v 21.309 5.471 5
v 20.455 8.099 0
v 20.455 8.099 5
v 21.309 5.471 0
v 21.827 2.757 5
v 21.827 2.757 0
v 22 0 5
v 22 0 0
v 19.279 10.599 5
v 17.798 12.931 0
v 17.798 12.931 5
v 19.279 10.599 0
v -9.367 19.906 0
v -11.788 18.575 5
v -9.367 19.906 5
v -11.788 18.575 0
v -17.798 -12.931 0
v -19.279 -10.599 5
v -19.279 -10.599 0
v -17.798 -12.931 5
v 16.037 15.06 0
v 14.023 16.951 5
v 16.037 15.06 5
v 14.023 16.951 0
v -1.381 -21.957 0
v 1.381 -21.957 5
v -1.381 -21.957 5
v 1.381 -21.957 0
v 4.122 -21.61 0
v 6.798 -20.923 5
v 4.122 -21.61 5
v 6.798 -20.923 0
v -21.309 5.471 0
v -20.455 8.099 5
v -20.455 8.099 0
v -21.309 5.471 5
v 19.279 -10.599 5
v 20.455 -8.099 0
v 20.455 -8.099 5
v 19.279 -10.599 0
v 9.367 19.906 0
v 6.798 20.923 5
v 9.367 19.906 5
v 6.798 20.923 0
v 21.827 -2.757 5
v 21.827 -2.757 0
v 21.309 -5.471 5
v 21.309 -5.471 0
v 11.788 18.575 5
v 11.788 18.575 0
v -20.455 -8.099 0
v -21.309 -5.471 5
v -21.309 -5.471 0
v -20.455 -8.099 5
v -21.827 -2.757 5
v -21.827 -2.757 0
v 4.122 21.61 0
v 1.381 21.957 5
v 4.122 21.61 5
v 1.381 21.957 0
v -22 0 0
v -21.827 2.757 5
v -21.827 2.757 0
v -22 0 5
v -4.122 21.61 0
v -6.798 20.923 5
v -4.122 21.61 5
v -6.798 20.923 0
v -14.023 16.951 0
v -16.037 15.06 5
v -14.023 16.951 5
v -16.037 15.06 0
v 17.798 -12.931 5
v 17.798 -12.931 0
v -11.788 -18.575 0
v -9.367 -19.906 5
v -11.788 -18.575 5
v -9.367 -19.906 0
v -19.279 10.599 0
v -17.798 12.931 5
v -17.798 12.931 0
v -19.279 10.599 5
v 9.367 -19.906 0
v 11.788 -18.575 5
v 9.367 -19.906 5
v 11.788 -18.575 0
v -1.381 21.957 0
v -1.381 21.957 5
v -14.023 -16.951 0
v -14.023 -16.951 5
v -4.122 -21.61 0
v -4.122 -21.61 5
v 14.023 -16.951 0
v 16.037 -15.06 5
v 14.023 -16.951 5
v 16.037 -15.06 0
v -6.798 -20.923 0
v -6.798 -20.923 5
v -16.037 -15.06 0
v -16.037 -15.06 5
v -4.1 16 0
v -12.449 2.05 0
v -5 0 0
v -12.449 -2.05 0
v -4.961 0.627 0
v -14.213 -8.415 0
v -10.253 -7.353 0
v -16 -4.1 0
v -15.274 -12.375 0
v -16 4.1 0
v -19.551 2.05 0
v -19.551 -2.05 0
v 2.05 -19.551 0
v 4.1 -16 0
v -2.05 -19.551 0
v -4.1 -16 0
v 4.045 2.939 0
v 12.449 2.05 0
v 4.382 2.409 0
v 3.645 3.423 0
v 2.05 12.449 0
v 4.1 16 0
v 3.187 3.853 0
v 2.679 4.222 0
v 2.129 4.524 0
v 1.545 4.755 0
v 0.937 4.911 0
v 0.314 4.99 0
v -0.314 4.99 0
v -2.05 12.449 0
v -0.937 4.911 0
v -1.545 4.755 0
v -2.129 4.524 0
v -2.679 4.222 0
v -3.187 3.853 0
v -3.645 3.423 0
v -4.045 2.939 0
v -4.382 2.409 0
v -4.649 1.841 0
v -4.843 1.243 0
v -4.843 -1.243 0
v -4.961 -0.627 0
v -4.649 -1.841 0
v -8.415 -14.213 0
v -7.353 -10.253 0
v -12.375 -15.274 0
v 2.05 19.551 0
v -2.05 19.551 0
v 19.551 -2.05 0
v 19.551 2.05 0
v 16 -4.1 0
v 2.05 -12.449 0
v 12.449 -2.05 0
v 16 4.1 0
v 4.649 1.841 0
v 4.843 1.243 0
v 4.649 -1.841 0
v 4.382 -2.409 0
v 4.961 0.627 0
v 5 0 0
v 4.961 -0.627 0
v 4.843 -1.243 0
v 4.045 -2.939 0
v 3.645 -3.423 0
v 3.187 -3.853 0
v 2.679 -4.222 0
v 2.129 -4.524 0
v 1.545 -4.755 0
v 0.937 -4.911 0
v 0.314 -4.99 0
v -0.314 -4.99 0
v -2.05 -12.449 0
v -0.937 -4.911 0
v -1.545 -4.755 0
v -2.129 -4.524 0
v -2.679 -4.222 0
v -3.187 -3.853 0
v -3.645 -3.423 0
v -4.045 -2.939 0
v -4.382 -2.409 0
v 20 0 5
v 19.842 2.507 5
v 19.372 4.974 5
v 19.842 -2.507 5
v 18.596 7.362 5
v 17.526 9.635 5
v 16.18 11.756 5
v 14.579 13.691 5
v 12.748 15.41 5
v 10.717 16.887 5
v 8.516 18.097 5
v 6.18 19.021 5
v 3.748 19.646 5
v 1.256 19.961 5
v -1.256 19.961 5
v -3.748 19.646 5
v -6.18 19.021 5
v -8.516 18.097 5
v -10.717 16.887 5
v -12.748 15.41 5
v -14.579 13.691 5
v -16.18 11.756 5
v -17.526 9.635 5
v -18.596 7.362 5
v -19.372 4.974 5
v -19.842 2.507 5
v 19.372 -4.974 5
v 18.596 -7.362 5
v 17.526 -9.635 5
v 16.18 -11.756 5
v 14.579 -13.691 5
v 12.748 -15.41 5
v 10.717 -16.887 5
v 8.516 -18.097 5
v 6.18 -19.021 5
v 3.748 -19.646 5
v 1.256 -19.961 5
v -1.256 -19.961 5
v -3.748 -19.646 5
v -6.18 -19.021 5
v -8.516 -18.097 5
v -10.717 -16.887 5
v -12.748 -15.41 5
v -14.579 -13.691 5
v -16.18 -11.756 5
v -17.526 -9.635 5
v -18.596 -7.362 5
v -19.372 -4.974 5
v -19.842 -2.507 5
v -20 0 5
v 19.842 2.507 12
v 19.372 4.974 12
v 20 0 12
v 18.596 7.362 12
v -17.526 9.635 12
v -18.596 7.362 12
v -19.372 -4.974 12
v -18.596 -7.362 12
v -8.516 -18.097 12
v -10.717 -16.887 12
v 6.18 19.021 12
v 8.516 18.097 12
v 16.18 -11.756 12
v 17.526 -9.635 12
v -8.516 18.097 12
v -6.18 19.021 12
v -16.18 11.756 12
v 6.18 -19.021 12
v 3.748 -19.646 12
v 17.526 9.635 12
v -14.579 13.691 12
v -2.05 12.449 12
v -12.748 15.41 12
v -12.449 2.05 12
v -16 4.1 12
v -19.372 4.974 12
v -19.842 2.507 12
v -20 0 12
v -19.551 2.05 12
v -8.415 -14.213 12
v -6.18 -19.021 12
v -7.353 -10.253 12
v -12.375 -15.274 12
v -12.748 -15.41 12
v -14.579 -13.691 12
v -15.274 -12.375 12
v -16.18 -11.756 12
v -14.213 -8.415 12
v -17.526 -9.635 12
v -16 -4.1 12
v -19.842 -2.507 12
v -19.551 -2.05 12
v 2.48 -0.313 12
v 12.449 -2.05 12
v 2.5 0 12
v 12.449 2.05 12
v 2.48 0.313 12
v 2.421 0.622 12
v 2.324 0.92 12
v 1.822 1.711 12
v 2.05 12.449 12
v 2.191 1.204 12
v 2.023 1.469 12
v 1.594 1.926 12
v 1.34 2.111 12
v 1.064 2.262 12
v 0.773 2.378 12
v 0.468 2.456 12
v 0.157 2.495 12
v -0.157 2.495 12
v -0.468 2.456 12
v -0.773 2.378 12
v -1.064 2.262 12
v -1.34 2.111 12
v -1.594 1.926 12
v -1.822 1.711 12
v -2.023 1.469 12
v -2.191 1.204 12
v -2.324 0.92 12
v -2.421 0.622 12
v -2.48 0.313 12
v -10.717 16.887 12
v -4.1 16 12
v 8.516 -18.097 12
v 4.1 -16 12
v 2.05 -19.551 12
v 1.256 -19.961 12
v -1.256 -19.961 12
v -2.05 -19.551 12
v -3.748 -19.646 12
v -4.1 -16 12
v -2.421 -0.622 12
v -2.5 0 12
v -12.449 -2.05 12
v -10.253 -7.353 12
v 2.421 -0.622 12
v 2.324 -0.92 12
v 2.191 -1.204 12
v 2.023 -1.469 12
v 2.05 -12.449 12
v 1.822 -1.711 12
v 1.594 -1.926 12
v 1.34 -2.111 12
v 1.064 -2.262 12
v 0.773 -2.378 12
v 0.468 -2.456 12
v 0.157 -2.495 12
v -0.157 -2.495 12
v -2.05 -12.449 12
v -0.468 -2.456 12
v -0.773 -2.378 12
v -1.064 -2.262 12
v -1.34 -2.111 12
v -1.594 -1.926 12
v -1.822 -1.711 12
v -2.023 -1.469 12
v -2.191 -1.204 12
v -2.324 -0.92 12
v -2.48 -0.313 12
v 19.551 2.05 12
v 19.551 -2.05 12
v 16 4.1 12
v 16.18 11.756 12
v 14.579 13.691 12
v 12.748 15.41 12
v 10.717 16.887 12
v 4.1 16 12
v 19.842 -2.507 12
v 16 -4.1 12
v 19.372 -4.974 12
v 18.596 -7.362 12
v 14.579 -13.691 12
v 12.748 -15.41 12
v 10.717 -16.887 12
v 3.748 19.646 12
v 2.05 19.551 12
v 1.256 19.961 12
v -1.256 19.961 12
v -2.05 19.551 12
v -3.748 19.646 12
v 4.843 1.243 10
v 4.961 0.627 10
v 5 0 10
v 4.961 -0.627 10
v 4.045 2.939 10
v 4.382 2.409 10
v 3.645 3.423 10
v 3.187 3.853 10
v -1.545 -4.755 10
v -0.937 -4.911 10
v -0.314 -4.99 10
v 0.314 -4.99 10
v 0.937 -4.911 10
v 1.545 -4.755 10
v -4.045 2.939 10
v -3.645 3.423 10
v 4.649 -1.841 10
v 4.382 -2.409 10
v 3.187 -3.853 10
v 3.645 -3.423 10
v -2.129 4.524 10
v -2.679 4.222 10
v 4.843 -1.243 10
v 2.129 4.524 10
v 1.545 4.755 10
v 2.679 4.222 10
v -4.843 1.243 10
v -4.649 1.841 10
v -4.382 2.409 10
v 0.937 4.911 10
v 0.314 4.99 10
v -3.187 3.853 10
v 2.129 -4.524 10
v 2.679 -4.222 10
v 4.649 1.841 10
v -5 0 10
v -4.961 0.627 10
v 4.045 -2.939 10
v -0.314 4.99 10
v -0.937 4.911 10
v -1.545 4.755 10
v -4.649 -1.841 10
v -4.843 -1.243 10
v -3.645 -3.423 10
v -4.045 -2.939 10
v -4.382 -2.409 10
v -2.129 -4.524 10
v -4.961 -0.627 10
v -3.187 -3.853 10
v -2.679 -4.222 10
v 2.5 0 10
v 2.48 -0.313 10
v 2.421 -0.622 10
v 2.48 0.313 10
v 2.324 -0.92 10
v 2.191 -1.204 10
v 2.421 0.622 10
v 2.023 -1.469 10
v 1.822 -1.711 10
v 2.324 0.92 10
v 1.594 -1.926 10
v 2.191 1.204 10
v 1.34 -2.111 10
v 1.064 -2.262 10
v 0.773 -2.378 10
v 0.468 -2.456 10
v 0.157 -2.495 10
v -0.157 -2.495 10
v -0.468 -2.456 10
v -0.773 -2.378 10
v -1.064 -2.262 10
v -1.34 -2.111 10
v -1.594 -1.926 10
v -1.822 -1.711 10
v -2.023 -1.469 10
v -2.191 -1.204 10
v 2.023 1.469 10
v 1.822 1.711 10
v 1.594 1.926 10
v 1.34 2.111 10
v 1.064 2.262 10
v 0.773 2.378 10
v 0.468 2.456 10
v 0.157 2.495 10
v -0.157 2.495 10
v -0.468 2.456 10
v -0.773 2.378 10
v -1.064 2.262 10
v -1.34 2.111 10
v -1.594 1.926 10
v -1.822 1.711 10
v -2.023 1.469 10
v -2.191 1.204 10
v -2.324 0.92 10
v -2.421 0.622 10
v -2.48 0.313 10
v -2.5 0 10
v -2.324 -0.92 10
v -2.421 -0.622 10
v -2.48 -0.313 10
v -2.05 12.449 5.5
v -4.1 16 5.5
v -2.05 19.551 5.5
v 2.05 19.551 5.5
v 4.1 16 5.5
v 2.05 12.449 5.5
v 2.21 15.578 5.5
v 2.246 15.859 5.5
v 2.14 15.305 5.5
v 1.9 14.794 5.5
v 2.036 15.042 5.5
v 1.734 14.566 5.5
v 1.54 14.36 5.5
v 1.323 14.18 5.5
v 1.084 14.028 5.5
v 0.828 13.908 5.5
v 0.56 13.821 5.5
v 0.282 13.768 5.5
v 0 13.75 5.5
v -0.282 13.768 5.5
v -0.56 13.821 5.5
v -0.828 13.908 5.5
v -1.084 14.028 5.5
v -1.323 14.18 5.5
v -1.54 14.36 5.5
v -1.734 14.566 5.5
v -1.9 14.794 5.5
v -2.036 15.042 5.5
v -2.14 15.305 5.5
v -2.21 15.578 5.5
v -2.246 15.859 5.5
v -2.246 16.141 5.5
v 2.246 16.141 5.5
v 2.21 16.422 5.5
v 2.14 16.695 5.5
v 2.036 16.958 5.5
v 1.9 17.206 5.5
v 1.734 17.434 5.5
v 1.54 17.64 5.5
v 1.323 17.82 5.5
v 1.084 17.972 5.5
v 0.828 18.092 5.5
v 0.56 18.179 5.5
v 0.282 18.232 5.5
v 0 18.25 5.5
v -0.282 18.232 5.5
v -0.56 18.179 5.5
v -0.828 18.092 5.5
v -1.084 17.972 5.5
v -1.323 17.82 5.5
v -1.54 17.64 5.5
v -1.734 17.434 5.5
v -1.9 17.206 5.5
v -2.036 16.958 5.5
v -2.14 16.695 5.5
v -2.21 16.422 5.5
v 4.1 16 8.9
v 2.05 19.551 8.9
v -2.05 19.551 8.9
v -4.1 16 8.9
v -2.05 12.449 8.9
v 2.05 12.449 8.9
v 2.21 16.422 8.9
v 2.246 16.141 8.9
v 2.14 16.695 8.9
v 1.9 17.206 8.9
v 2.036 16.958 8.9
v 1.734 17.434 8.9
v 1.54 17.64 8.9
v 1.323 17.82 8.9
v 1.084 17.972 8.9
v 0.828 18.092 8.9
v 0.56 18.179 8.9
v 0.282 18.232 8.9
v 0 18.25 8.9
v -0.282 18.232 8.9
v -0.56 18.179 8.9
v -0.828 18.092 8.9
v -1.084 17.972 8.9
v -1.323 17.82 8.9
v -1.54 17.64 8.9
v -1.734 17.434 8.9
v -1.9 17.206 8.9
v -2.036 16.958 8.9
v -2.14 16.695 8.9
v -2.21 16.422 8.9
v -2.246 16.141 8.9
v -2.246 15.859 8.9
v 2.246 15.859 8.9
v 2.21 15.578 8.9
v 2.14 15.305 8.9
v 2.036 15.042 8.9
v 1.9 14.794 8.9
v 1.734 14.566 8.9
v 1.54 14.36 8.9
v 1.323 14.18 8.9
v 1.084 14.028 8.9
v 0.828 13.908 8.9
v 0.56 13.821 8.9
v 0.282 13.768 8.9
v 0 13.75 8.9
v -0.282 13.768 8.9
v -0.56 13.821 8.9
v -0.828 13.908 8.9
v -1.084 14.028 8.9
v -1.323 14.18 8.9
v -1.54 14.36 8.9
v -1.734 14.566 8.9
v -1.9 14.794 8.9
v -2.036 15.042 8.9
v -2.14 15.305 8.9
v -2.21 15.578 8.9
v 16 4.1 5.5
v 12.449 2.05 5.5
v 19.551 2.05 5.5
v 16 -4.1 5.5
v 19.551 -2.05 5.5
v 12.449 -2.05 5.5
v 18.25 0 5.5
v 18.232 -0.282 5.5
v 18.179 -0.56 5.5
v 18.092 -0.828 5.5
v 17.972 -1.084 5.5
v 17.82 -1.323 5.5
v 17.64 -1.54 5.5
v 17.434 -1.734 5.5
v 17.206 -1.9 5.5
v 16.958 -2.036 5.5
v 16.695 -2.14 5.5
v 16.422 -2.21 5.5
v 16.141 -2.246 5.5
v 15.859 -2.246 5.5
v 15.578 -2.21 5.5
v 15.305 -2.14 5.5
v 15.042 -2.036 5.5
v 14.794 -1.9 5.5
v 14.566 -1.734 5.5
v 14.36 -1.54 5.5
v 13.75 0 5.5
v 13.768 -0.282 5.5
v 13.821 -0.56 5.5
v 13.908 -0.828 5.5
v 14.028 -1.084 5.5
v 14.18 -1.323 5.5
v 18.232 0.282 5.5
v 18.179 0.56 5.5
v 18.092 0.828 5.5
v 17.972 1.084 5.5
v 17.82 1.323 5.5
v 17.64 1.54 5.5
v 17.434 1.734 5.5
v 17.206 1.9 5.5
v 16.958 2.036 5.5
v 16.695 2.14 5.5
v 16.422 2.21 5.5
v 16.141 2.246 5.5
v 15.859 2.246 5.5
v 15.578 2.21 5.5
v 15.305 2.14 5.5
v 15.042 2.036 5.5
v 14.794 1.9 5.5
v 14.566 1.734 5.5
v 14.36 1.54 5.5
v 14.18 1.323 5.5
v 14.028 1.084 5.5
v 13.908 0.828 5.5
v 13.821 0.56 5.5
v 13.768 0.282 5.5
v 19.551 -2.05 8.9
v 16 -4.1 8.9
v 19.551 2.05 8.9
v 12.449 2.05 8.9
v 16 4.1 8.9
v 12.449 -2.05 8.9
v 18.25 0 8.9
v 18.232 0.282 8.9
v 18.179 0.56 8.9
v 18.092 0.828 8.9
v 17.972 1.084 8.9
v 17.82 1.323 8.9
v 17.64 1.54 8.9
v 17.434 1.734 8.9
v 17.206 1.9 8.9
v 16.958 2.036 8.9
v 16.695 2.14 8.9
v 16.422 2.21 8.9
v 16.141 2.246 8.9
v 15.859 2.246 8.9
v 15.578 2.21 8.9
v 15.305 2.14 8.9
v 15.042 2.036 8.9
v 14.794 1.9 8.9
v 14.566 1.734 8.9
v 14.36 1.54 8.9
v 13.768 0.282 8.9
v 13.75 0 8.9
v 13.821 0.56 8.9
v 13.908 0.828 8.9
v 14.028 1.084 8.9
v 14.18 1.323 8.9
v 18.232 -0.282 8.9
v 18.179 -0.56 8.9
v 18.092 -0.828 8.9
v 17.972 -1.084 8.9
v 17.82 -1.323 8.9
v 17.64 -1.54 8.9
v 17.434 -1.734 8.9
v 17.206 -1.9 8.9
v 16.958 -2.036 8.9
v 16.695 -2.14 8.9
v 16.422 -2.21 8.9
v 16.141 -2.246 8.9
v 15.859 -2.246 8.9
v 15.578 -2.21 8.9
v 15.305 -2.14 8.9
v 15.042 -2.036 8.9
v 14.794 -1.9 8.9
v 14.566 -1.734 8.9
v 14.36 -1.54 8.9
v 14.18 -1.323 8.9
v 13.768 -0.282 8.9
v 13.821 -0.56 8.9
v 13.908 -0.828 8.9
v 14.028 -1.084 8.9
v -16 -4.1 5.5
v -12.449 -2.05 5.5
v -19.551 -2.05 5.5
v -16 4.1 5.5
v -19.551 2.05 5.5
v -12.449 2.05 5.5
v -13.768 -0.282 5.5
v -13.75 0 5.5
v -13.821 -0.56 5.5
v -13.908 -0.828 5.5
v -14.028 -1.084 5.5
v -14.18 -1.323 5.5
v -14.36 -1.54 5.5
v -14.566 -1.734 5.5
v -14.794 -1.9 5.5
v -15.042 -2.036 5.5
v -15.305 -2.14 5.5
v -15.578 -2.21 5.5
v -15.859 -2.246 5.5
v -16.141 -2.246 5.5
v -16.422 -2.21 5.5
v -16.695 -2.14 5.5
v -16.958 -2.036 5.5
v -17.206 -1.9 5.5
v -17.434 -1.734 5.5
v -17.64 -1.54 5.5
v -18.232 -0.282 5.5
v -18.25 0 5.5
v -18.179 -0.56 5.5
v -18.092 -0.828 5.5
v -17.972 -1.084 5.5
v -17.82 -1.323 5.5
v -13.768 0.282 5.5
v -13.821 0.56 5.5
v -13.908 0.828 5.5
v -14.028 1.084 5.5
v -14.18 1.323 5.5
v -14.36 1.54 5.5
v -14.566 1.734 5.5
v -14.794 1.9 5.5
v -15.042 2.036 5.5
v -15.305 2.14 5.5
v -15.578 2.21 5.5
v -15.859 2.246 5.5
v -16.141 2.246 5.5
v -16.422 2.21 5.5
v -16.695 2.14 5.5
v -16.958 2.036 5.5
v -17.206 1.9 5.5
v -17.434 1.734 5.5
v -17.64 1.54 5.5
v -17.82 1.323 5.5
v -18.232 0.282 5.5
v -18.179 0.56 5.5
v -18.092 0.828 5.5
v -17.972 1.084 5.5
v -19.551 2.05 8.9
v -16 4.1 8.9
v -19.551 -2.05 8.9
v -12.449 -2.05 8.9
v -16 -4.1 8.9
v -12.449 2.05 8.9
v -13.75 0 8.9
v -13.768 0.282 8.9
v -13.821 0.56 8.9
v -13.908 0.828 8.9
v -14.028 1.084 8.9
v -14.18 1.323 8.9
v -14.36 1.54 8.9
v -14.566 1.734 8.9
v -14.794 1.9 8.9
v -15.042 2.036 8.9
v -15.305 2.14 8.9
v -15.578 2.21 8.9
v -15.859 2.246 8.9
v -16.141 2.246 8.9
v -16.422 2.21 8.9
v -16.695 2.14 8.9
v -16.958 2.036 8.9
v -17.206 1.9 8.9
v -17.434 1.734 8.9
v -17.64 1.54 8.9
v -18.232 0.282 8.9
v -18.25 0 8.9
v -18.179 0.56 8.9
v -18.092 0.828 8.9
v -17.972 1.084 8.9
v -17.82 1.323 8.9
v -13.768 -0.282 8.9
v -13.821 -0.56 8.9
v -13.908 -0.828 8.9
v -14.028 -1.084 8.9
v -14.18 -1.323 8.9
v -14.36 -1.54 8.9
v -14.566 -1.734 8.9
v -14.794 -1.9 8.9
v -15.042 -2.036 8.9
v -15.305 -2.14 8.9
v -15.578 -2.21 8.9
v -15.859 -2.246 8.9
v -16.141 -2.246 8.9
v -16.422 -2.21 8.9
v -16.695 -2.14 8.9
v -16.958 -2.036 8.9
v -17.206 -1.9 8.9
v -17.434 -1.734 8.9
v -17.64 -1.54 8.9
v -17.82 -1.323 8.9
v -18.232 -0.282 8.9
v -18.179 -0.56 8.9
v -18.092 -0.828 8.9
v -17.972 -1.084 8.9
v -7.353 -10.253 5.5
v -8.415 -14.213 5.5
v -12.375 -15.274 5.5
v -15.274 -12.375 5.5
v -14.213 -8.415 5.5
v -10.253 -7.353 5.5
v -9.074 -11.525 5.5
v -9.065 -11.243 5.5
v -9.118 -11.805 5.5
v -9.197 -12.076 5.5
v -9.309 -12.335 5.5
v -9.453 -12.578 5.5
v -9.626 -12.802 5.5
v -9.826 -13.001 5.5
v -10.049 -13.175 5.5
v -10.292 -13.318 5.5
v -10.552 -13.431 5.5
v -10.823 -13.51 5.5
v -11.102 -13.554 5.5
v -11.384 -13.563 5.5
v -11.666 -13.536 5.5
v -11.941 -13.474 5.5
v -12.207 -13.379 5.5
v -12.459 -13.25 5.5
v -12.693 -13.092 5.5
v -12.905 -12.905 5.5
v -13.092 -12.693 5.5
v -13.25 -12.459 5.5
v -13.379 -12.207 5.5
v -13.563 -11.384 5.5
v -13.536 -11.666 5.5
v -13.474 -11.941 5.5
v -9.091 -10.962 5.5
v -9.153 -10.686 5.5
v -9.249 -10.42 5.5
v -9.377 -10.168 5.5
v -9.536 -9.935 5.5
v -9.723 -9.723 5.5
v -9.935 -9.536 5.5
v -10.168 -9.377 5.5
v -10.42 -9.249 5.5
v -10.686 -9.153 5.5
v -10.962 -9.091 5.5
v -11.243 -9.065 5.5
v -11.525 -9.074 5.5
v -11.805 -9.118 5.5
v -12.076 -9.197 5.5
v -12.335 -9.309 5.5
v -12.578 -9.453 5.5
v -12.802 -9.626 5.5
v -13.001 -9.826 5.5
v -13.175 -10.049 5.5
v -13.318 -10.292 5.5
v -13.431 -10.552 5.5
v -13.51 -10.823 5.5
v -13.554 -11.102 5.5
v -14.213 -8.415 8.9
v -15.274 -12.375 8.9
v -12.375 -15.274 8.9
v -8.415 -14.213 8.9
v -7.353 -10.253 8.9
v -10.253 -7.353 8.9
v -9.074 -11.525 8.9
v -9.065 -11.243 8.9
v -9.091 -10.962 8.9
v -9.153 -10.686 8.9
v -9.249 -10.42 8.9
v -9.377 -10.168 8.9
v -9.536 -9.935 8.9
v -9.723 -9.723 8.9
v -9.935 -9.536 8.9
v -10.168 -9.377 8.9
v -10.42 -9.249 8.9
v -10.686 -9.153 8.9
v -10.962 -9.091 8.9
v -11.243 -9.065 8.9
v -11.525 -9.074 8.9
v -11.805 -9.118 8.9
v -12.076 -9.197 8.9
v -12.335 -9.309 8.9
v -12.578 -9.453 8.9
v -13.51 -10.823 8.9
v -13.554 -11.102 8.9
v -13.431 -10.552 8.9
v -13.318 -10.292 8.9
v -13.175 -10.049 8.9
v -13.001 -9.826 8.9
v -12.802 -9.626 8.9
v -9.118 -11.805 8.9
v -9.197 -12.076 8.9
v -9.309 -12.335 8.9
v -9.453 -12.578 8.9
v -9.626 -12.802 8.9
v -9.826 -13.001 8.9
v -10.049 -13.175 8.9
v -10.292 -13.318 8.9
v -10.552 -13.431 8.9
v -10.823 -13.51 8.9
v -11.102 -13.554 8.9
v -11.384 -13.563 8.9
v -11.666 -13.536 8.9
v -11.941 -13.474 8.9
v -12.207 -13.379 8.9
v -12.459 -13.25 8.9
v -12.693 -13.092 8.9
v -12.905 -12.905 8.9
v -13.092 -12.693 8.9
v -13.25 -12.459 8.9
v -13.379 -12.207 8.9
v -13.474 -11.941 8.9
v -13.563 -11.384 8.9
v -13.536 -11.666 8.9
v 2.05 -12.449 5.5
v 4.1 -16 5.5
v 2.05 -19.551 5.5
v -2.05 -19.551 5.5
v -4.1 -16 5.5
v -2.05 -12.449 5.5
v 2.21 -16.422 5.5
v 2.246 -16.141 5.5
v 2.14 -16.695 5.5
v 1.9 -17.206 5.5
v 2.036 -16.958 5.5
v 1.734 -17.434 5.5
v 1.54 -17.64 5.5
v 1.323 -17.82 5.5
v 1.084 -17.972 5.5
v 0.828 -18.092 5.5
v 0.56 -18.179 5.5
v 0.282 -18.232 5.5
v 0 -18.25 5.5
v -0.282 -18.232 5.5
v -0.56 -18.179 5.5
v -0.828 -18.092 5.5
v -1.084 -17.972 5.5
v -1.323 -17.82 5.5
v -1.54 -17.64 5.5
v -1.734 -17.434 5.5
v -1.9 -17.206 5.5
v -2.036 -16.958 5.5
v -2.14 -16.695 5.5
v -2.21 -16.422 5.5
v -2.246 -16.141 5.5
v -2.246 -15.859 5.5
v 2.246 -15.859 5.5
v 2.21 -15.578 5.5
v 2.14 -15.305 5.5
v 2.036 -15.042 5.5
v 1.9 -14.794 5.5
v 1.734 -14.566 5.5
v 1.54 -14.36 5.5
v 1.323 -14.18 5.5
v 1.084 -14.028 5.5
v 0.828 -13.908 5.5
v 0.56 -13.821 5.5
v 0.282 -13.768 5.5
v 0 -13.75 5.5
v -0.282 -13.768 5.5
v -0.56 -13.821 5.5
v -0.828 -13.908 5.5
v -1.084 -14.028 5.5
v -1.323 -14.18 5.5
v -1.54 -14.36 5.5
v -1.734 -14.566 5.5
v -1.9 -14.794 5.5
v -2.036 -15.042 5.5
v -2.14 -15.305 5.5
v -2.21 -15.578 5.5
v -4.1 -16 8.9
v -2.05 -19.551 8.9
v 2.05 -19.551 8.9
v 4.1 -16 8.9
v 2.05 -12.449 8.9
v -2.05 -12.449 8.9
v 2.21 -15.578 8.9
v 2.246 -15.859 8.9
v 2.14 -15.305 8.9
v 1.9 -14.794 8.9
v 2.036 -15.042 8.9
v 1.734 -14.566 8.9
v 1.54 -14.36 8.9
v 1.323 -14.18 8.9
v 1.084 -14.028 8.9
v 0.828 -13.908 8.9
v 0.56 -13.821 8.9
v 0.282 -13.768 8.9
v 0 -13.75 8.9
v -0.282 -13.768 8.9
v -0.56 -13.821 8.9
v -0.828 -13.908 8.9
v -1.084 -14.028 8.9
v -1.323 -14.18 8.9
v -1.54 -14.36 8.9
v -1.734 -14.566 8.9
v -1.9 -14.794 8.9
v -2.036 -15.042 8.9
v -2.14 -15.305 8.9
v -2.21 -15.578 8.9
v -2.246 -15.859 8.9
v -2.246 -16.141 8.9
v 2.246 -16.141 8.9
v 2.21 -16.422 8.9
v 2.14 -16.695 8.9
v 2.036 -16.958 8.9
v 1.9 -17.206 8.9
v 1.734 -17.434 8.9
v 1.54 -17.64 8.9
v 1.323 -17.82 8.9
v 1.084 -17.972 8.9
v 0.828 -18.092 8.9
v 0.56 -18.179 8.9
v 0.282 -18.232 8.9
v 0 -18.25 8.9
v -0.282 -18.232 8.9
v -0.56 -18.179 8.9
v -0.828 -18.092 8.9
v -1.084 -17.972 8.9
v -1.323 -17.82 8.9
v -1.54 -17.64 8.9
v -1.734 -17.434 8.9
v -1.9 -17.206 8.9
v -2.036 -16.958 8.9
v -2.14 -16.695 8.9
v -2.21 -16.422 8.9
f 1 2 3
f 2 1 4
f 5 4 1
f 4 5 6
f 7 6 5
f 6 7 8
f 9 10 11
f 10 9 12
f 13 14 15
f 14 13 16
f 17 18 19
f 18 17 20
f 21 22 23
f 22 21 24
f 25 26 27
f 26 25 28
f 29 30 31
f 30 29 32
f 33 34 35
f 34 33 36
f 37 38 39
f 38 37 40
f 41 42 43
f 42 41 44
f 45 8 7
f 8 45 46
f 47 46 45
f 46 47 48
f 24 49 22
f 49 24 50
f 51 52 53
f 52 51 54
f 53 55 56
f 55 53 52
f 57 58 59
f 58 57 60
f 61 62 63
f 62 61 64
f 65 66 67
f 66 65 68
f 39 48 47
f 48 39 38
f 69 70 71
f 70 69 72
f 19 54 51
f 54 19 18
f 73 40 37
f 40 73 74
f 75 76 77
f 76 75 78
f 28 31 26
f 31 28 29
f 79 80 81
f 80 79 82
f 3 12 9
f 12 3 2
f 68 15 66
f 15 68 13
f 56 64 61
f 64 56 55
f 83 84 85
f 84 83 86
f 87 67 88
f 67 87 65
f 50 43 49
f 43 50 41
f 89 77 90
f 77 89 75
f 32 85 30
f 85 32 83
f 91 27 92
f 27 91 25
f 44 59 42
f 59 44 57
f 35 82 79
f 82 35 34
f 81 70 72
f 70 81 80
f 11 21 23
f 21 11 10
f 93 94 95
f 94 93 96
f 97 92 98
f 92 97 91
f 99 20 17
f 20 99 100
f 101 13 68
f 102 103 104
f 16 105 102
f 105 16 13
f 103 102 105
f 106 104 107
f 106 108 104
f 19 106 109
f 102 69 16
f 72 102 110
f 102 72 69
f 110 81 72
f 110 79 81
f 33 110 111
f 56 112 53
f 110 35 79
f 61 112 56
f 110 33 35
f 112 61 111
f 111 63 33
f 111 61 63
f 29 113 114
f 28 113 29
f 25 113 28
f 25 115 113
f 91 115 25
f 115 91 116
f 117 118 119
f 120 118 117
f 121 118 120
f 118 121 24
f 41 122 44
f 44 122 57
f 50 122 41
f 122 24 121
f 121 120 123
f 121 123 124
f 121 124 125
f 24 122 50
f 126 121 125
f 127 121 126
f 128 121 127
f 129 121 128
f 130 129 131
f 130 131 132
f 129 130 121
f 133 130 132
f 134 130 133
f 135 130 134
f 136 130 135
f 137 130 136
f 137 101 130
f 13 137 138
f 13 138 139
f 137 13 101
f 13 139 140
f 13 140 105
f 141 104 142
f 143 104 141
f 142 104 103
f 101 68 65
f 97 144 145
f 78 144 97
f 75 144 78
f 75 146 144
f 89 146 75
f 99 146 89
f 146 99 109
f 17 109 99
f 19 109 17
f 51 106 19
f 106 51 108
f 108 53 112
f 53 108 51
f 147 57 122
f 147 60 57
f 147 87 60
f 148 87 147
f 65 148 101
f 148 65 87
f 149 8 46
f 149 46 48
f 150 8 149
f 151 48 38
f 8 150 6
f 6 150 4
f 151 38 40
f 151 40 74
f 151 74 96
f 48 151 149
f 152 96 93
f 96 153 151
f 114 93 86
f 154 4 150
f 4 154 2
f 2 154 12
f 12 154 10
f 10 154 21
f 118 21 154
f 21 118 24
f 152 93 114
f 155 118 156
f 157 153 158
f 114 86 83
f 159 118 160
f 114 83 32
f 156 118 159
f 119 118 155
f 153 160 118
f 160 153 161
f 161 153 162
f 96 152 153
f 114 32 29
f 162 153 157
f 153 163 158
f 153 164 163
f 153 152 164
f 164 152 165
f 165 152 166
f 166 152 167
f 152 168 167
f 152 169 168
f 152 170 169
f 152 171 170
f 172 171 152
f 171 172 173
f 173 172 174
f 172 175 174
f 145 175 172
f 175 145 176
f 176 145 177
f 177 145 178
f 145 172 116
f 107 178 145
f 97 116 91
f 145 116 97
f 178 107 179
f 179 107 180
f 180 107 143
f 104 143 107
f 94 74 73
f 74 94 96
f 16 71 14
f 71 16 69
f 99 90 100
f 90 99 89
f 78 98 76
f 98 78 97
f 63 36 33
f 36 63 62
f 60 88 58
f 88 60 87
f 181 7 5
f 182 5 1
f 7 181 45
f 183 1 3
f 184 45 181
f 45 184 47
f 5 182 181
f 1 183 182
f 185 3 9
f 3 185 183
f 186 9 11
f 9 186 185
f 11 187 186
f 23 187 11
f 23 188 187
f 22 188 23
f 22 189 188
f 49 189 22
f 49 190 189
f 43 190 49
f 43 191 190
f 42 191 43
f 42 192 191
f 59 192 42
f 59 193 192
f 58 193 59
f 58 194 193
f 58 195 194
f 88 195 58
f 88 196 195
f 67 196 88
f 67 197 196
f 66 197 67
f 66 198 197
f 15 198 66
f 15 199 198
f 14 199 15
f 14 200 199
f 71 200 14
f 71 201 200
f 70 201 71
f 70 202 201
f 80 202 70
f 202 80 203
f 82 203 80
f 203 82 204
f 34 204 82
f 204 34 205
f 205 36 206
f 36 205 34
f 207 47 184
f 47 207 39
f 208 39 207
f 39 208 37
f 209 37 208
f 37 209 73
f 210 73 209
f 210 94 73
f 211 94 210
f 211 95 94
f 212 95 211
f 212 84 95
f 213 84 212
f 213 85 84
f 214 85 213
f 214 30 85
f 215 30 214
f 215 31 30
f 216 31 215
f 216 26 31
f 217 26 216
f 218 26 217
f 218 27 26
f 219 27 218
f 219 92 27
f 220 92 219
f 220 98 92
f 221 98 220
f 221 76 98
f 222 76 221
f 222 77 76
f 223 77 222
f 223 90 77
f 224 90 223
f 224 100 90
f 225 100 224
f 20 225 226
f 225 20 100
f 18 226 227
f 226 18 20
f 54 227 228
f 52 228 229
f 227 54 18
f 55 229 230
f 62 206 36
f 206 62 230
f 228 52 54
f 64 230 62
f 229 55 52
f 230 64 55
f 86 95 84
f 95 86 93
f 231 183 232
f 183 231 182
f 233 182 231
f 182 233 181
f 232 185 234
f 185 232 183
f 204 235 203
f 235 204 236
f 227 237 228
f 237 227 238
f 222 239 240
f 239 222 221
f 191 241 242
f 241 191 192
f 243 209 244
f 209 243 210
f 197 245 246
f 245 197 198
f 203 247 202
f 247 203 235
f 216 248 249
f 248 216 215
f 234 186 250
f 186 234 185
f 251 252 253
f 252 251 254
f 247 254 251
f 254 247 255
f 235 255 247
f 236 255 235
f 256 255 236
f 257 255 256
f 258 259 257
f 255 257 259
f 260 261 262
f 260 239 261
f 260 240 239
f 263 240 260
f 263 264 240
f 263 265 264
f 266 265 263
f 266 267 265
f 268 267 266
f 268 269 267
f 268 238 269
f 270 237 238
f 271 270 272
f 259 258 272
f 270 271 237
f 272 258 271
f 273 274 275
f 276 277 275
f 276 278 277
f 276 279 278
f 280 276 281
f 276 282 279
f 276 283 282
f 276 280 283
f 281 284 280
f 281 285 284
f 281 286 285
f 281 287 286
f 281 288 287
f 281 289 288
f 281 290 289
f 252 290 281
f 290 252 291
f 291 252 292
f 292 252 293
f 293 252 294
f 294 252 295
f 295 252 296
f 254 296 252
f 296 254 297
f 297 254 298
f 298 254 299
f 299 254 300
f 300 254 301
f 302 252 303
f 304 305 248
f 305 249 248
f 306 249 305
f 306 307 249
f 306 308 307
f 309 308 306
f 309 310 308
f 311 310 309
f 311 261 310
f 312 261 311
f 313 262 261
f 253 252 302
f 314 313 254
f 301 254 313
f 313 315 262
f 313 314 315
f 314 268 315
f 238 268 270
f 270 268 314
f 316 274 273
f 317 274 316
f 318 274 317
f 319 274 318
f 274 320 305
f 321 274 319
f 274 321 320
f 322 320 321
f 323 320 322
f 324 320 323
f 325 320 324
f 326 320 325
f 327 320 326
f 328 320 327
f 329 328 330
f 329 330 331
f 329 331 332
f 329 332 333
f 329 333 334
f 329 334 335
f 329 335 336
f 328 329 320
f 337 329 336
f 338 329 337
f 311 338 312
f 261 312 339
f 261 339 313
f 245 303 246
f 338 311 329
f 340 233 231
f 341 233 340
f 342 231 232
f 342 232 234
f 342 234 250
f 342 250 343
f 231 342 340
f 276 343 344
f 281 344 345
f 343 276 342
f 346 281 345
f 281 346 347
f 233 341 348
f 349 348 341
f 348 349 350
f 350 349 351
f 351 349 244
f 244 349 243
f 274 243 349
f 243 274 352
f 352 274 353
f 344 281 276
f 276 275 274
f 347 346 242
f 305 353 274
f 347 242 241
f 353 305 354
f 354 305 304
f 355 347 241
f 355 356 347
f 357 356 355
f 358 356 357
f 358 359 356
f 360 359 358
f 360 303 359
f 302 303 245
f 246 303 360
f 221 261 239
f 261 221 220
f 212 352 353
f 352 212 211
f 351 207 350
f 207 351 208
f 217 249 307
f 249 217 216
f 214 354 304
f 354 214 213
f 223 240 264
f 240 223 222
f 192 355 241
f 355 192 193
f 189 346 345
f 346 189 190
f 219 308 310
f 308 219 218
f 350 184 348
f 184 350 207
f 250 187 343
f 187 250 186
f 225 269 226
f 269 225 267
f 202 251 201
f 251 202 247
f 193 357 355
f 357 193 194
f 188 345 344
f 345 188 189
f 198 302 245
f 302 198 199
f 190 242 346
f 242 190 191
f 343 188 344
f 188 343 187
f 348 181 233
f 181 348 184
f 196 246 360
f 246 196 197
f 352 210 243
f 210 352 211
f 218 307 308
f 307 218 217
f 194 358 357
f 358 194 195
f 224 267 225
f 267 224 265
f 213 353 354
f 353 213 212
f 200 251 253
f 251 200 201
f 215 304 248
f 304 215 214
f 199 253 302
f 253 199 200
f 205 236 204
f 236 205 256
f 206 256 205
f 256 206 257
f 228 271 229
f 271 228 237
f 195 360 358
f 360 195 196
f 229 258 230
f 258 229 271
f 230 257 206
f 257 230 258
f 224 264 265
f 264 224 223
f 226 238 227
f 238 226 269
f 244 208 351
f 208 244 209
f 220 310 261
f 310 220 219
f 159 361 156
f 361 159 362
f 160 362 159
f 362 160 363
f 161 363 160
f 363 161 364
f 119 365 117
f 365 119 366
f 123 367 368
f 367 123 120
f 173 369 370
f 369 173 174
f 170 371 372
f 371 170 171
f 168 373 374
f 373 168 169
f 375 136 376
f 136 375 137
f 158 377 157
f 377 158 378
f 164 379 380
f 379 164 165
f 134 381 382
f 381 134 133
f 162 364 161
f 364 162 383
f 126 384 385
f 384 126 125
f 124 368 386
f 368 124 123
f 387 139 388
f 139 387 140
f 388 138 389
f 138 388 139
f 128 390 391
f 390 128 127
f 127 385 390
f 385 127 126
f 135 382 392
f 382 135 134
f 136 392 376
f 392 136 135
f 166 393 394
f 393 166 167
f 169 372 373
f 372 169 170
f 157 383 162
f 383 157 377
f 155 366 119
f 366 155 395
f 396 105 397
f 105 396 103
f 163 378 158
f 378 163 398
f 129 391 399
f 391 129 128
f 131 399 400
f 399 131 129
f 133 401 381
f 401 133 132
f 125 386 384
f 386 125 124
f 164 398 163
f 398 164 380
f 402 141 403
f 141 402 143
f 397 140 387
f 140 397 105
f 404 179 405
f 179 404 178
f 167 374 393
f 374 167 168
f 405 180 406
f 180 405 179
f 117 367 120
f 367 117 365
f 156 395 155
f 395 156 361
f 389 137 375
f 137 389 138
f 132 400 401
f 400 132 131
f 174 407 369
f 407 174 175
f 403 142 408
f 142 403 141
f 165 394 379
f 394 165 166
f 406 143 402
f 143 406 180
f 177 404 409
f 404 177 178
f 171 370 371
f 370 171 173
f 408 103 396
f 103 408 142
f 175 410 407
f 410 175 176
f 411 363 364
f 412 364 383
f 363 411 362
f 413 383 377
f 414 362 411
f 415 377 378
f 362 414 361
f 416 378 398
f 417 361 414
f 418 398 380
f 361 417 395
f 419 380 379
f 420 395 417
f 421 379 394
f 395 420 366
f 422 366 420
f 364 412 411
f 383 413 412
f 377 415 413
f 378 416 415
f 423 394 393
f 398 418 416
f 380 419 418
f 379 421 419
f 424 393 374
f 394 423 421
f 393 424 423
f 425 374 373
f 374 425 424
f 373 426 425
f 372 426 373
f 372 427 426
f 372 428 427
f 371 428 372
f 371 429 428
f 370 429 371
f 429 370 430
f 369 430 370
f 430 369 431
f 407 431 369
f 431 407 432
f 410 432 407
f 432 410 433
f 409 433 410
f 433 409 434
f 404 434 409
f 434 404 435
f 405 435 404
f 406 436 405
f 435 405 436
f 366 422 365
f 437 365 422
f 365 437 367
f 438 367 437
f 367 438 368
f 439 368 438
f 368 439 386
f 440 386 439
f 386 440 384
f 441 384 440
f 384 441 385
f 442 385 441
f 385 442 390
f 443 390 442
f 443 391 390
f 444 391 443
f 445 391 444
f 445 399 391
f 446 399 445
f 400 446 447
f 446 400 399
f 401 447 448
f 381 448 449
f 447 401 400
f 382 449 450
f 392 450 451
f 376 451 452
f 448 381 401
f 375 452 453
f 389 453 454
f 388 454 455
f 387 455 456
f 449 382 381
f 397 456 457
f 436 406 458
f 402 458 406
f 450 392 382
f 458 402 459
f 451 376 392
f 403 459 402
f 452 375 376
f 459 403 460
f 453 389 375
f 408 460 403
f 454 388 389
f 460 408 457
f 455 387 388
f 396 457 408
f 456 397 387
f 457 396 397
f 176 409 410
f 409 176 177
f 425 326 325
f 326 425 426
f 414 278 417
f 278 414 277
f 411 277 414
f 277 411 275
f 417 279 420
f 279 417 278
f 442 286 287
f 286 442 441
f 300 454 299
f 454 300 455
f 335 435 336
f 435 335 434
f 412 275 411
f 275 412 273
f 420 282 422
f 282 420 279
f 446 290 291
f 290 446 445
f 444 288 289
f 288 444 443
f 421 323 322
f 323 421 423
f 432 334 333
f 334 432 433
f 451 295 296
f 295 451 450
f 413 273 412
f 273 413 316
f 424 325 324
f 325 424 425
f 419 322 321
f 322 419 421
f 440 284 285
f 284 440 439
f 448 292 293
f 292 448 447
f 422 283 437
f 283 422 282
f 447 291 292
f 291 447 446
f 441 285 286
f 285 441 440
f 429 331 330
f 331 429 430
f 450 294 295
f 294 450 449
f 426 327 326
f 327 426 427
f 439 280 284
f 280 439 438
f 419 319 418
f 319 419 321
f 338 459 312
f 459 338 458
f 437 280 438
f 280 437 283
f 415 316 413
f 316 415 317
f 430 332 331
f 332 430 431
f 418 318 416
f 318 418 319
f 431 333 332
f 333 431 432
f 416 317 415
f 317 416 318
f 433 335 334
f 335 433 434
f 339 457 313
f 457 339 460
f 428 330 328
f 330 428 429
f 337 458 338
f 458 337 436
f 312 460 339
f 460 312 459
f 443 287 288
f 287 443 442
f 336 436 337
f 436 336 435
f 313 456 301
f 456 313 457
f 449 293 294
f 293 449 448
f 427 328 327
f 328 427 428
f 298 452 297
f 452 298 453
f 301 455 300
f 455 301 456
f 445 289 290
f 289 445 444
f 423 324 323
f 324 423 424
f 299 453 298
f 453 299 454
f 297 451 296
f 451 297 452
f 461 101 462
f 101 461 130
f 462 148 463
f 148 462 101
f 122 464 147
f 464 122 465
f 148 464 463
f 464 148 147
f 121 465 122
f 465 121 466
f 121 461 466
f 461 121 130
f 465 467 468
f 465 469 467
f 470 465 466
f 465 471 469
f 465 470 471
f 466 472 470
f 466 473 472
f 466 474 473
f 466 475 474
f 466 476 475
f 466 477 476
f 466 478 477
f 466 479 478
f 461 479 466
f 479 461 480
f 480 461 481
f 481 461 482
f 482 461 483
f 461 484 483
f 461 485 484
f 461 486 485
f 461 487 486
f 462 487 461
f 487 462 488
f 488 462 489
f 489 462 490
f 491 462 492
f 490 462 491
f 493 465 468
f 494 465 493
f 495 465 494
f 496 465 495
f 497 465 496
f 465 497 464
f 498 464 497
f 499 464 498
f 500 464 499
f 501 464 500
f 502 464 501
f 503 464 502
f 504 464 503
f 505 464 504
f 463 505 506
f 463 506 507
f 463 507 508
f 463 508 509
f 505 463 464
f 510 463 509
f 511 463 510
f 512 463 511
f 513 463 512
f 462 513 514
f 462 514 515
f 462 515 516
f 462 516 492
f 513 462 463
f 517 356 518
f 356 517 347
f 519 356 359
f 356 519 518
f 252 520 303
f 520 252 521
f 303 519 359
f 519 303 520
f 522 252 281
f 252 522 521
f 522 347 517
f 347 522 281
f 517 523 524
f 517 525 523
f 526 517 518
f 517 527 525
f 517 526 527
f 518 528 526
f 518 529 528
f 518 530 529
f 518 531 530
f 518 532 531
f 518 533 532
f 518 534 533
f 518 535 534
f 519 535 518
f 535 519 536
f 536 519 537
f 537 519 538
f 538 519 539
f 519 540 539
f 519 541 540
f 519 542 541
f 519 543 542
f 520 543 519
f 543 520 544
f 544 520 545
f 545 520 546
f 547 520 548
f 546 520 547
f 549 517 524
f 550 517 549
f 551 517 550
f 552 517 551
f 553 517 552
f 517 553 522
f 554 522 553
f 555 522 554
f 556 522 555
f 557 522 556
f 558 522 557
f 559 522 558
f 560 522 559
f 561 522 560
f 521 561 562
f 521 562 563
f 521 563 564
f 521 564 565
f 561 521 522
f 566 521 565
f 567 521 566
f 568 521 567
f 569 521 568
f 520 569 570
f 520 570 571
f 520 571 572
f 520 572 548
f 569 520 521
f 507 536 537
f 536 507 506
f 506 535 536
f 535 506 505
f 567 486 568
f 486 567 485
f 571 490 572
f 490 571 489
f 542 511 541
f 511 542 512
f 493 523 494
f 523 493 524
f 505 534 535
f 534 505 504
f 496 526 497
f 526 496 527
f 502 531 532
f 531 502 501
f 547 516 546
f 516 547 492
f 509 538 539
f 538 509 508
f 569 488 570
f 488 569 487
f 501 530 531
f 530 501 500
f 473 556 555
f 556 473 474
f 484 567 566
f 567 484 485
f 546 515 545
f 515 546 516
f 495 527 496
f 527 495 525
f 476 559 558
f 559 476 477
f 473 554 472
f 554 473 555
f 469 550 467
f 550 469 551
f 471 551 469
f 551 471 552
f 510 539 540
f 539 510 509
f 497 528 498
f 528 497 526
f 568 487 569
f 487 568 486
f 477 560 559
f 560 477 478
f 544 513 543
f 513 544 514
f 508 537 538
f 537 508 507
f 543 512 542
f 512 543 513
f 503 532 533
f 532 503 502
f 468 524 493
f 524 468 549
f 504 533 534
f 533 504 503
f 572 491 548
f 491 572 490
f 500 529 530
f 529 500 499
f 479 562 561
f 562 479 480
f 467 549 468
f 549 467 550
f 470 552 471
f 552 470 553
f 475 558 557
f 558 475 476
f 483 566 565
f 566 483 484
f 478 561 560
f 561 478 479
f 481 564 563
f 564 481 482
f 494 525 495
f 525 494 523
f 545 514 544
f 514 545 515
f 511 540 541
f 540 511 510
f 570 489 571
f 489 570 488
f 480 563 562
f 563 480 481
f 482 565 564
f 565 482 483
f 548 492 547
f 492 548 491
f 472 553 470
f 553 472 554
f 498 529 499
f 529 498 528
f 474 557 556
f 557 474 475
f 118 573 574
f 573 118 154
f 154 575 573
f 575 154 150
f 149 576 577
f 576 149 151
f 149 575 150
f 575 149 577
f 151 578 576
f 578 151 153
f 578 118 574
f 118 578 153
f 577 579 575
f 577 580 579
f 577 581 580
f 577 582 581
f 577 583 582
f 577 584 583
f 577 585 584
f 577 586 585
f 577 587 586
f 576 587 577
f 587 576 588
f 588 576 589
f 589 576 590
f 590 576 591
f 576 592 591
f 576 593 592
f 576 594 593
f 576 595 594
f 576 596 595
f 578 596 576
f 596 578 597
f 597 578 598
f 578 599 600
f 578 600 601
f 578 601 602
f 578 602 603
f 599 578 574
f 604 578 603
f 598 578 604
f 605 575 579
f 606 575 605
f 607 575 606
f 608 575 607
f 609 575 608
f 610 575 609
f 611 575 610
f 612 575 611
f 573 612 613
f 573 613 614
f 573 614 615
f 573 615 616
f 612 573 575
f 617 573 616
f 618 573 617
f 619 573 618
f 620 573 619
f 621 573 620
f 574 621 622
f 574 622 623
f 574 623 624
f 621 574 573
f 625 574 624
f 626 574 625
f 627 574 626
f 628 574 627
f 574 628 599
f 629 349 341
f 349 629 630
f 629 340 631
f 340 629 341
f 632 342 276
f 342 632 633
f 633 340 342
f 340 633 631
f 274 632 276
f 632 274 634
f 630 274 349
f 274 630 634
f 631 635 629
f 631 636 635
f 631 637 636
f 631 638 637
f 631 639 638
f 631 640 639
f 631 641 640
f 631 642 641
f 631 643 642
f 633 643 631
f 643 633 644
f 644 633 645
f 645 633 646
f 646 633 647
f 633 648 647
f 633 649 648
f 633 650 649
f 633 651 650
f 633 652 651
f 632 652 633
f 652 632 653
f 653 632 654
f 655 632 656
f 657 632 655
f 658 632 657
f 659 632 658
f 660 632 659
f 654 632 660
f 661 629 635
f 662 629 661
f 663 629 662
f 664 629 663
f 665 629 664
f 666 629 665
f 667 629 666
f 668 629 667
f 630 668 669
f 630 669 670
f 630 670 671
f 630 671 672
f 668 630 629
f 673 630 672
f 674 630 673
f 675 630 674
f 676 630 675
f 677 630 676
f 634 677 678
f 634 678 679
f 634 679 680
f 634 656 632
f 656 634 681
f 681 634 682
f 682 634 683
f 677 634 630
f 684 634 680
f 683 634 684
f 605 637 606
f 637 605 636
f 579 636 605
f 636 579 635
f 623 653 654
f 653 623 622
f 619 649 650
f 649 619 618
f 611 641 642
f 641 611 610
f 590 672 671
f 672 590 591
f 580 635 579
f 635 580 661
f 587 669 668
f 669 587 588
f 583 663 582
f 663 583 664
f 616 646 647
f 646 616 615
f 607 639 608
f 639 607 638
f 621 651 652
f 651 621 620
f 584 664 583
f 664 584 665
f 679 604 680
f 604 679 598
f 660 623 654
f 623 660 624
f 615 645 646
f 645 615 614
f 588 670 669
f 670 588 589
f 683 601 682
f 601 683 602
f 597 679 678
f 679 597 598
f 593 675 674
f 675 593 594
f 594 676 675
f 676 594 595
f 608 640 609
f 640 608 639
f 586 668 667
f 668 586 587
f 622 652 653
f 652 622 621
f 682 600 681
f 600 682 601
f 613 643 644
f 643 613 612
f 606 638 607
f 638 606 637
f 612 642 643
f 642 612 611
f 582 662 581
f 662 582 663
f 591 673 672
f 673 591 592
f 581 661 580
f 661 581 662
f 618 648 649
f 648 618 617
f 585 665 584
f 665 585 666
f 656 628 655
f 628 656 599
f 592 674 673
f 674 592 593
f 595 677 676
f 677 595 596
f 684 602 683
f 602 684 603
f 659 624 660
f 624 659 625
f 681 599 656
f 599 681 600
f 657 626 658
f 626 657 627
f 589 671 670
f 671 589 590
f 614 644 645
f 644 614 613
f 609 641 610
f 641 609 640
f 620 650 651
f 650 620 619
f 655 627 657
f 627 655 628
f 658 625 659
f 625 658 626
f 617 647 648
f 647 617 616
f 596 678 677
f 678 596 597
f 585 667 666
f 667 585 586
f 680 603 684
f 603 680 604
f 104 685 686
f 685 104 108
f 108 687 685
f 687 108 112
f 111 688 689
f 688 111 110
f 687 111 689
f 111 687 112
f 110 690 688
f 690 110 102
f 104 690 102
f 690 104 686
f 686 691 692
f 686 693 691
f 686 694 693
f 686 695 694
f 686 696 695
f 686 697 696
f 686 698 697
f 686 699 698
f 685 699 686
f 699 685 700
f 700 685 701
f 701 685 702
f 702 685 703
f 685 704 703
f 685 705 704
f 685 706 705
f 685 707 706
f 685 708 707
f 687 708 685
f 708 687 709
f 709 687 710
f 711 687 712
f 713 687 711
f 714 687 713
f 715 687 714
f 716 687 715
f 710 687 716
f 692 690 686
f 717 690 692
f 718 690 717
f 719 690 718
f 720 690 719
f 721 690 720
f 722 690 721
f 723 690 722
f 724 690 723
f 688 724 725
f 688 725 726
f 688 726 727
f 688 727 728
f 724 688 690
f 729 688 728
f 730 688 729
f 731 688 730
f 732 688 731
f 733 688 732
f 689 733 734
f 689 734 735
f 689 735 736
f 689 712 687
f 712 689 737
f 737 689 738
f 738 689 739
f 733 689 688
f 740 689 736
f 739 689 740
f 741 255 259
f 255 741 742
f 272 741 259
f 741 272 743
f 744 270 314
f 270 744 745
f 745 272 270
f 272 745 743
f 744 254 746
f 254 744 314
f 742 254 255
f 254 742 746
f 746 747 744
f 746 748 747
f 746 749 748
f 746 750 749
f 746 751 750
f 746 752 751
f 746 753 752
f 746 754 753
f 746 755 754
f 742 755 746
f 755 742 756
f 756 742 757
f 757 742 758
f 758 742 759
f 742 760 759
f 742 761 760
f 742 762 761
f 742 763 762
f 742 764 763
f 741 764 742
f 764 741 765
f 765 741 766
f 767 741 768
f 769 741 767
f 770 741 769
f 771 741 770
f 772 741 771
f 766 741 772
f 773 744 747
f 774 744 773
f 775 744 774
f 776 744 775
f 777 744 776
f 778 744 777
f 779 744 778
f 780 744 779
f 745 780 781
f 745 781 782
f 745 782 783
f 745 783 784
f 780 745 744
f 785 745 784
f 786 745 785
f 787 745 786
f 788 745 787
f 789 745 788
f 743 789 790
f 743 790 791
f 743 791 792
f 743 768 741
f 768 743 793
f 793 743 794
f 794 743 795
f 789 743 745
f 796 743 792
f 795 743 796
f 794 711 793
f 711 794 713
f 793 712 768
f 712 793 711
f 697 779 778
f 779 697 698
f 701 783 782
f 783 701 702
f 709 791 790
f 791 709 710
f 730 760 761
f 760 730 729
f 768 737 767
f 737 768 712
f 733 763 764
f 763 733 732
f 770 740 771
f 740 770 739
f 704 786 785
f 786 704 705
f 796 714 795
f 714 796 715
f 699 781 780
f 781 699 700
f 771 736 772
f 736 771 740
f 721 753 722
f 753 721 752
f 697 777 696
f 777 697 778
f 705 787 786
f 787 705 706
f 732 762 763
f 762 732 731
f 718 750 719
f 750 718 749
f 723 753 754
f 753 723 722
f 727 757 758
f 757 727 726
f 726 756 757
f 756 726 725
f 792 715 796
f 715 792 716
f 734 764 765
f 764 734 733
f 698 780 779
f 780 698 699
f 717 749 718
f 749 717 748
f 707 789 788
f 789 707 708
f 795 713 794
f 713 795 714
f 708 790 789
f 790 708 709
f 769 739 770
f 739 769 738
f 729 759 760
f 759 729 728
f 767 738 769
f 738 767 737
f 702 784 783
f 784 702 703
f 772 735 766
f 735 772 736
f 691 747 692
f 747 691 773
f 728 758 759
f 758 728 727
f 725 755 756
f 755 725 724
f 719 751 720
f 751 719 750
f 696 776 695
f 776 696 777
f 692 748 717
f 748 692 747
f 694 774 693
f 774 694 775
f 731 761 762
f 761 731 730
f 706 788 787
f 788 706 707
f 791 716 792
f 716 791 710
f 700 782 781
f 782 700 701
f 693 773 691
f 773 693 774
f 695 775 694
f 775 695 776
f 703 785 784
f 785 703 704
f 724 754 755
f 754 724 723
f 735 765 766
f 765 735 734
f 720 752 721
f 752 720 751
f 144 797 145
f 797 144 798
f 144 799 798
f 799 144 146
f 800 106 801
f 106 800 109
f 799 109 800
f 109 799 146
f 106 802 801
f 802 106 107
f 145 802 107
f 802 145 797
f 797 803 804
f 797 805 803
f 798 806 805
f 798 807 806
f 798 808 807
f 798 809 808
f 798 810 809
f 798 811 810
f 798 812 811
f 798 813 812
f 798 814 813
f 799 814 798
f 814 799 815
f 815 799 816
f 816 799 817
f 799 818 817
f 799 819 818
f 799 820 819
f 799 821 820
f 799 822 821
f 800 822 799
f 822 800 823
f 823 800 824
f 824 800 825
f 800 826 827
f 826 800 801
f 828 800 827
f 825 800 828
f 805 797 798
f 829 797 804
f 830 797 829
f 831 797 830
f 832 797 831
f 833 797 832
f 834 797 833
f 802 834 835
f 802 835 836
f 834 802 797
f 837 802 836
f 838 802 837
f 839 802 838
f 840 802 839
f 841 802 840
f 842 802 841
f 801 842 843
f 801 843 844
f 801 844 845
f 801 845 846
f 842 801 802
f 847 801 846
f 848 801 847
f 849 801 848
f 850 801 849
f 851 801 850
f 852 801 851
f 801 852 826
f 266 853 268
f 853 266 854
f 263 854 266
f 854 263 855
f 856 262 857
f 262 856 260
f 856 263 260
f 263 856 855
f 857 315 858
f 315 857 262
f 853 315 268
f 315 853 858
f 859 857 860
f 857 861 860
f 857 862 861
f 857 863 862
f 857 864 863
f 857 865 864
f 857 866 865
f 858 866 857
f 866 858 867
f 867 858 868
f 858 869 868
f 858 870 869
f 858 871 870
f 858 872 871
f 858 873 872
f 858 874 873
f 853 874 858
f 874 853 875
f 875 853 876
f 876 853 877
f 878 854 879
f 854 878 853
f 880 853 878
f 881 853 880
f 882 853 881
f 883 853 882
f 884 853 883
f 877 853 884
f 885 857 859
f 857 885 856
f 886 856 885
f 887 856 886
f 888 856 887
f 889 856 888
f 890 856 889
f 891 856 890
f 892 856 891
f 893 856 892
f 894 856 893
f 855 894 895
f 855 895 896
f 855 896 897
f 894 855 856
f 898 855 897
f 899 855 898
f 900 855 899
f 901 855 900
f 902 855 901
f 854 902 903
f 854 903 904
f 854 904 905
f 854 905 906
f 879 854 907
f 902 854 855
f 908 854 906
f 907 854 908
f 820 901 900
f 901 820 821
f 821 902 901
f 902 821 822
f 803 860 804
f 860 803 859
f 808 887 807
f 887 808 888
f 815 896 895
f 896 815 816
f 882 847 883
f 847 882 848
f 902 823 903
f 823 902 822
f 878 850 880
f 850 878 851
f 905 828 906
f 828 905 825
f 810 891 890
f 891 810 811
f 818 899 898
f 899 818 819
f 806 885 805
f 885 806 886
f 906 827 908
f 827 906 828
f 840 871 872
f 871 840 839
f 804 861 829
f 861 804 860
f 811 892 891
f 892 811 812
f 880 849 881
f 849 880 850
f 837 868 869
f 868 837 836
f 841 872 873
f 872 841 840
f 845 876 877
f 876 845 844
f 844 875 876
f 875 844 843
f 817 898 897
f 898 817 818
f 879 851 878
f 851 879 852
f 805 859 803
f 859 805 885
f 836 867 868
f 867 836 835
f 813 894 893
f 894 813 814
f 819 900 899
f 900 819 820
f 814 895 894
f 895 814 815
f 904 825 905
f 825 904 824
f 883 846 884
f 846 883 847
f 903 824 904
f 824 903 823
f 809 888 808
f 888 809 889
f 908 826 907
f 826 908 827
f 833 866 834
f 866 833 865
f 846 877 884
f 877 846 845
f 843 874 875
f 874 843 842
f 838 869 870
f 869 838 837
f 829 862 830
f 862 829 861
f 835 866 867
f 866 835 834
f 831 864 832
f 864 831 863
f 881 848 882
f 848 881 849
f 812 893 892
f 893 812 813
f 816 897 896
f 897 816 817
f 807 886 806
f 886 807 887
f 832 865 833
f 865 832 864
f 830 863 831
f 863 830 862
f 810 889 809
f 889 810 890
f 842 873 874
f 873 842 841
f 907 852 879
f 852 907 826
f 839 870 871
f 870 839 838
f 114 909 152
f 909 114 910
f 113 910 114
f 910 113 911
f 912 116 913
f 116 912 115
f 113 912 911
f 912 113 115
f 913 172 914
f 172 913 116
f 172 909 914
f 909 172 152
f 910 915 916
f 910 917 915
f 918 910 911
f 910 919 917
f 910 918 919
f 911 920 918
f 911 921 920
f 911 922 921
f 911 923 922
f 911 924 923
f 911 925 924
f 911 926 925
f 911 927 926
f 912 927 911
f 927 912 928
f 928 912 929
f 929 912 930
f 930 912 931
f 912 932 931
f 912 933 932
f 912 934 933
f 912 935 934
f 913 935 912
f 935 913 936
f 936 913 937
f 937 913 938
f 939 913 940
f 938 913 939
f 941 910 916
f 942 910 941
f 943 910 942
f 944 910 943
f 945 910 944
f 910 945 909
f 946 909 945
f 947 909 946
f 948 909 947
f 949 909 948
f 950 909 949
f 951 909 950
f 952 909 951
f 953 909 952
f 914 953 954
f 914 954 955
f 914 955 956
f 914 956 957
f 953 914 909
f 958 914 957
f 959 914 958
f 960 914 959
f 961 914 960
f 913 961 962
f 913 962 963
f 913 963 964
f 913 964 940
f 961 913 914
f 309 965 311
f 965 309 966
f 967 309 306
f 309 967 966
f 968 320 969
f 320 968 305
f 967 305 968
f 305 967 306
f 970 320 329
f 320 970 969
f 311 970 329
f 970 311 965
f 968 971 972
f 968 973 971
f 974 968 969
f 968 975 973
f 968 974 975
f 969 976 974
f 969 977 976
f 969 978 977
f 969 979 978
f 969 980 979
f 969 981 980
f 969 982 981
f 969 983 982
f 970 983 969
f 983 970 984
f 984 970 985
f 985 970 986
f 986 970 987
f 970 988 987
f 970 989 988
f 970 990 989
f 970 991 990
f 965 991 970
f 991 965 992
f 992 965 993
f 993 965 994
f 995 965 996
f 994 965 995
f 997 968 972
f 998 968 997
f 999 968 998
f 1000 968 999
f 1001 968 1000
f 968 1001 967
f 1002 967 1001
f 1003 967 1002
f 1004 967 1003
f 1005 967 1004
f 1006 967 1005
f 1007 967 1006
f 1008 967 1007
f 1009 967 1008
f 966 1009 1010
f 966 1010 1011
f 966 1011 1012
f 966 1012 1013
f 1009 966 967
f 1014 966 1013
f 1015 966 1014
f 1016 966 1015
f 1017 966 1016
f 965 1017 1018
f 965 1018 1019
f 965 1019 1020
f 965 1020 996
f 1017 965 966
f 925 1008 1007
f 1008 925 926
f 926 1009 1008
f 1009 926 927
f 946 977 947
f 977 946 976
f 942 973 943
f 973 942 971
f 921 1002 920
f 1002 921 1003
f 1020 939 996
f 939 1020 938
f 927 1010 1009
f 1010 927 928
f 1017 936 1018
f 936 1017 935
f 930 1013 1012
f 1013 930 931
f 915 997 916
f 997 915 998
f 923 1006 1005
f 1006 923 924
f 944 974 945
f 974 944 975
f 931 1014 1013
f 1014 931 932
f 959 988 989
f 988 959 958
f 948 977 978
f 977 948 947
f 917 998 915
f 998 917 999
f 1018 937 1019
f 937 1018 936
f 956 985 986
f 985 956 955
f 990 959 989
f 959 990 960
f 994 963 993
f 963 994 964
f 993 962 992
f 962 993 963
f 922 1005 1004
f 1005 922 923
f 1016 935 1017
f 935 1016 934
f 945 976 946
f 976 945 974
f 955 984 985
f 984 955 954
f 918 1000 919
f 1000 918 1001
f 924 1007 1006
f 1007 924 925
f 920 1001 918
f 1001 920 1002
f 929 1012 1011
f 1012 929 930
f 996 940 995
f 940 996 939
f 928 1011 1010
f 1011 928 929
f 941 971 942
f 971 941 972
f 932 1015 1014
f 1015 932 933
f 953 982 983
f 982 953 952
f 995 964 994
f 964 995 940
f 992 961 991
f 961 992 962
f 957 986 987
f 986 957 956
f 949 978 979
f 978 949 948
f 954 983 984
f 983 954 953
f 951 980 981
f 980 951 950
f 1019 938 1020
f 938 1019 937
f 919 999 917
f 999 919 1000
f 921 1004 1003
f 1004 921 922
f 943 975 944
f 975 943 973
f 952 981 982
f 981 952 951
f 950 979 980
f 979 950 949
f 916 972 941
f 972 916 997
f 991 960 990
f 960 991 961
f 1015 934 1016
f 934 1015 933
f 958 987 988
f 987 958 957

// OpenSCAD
margen_error=0.5;

//Tuercas M3
//radio_tuercas=3+(margen_error/2);
//alto_tuerca=2.3;
//alto_hexagono_tuerca_ciega=4.5;
//radio_tornillo=1.5+(margen_error/2);

//Tuercas M4 
radio_tuercas=3.85+(margen_error/2);
alto_tuerca=3.1;
alto_hexagono_tuerca_ciega=5.5;
radio_tornillo=2+(margen_error/2);

radio_exterior_cabezal=22;
radio_interior_cabezal=20;
alto_exterior_cabezal=5;
alto_interior_cabezal=7;
alto_total_cabezal=alto_exterior_cabezal+alto_interior_cabezal;

radio_ubicacion_electrodos=16; //Radio en el que van a estar los electrodos respecto del centro del cabezal
separacion_electrodo=0; //Distancia más chica de un electrodo al eje. Poner en 0 para electrodos sobre los ejes
angulo_RL=225;

radio_microfono=5;
alto_microfono=10;
radio_cable_microfono=2.5;


echo("Diametro tuercas",radio_tuercas*2);
echo("Diametro tornillo",radio_tornillo*2);
echo("altura total del cabezal=",alto_total_cabezal);

module tuerca(){
    cylinder(r=radio_tuercas, h=alto_tuerca, $fn=6);
}

module tuerca_ciega(){
    cylinder(r=radio_tuercas, h=alto_hexagono_tuerca_ciega, $fn=6);
    translate([0, 0, alto_hexagono_tuerca_ciega]) cylinder(r1=2.5, r2=1.5, h=3, $fn=50);
}

module tornillo(){
    cylinder(r=radio_tornillo, h=25, $fn=50);
}

module microfono(){
    cylinder(r=radio_microfono, h=alto_microfono, $fn=50);
    cylinder(r=radio_cable_microfono, h=alto_total_cabezal, $fn=50);
}

module cabezal(){
    cylinder(r=radio_exterior_cabezal, h=alto_exterior_cabezal, $fn=50);
    translate([0, 0, alto_exterior_cabezal])
        cylinder(r=radio_interior_cabezal, h=alto_interior_cabezal, $fn=50);
}

module electrodo(){
    rotate([180, 0, 30])
        translate([0, 0, -alto_hexagono_tuerca_ciega])
            tuerca_ciega();
    rotate([0, 0, 30])
        translate([0, 0, alto_total_cabezal-alto_tuerca])
            tuerca();
    tornillo();
}

module grupo_de_electrodos(){
    angulo_electrodo=acos(separacion_electrodo/radio_ubicacion_electrodos);
    for(i=[angulo_electrodo,90-angulo_electrodo, 90+angulo_electrodo, angulo_RL, 360-angulo_electrodo]){
        rotate([0, 0, i])
            translate([radio_ubicacion_electrodos, 0, 0])
               electrodo();
    }
}

difference(){
    cabezal();
    microfono();
    grupo_de_electrodos();
}
